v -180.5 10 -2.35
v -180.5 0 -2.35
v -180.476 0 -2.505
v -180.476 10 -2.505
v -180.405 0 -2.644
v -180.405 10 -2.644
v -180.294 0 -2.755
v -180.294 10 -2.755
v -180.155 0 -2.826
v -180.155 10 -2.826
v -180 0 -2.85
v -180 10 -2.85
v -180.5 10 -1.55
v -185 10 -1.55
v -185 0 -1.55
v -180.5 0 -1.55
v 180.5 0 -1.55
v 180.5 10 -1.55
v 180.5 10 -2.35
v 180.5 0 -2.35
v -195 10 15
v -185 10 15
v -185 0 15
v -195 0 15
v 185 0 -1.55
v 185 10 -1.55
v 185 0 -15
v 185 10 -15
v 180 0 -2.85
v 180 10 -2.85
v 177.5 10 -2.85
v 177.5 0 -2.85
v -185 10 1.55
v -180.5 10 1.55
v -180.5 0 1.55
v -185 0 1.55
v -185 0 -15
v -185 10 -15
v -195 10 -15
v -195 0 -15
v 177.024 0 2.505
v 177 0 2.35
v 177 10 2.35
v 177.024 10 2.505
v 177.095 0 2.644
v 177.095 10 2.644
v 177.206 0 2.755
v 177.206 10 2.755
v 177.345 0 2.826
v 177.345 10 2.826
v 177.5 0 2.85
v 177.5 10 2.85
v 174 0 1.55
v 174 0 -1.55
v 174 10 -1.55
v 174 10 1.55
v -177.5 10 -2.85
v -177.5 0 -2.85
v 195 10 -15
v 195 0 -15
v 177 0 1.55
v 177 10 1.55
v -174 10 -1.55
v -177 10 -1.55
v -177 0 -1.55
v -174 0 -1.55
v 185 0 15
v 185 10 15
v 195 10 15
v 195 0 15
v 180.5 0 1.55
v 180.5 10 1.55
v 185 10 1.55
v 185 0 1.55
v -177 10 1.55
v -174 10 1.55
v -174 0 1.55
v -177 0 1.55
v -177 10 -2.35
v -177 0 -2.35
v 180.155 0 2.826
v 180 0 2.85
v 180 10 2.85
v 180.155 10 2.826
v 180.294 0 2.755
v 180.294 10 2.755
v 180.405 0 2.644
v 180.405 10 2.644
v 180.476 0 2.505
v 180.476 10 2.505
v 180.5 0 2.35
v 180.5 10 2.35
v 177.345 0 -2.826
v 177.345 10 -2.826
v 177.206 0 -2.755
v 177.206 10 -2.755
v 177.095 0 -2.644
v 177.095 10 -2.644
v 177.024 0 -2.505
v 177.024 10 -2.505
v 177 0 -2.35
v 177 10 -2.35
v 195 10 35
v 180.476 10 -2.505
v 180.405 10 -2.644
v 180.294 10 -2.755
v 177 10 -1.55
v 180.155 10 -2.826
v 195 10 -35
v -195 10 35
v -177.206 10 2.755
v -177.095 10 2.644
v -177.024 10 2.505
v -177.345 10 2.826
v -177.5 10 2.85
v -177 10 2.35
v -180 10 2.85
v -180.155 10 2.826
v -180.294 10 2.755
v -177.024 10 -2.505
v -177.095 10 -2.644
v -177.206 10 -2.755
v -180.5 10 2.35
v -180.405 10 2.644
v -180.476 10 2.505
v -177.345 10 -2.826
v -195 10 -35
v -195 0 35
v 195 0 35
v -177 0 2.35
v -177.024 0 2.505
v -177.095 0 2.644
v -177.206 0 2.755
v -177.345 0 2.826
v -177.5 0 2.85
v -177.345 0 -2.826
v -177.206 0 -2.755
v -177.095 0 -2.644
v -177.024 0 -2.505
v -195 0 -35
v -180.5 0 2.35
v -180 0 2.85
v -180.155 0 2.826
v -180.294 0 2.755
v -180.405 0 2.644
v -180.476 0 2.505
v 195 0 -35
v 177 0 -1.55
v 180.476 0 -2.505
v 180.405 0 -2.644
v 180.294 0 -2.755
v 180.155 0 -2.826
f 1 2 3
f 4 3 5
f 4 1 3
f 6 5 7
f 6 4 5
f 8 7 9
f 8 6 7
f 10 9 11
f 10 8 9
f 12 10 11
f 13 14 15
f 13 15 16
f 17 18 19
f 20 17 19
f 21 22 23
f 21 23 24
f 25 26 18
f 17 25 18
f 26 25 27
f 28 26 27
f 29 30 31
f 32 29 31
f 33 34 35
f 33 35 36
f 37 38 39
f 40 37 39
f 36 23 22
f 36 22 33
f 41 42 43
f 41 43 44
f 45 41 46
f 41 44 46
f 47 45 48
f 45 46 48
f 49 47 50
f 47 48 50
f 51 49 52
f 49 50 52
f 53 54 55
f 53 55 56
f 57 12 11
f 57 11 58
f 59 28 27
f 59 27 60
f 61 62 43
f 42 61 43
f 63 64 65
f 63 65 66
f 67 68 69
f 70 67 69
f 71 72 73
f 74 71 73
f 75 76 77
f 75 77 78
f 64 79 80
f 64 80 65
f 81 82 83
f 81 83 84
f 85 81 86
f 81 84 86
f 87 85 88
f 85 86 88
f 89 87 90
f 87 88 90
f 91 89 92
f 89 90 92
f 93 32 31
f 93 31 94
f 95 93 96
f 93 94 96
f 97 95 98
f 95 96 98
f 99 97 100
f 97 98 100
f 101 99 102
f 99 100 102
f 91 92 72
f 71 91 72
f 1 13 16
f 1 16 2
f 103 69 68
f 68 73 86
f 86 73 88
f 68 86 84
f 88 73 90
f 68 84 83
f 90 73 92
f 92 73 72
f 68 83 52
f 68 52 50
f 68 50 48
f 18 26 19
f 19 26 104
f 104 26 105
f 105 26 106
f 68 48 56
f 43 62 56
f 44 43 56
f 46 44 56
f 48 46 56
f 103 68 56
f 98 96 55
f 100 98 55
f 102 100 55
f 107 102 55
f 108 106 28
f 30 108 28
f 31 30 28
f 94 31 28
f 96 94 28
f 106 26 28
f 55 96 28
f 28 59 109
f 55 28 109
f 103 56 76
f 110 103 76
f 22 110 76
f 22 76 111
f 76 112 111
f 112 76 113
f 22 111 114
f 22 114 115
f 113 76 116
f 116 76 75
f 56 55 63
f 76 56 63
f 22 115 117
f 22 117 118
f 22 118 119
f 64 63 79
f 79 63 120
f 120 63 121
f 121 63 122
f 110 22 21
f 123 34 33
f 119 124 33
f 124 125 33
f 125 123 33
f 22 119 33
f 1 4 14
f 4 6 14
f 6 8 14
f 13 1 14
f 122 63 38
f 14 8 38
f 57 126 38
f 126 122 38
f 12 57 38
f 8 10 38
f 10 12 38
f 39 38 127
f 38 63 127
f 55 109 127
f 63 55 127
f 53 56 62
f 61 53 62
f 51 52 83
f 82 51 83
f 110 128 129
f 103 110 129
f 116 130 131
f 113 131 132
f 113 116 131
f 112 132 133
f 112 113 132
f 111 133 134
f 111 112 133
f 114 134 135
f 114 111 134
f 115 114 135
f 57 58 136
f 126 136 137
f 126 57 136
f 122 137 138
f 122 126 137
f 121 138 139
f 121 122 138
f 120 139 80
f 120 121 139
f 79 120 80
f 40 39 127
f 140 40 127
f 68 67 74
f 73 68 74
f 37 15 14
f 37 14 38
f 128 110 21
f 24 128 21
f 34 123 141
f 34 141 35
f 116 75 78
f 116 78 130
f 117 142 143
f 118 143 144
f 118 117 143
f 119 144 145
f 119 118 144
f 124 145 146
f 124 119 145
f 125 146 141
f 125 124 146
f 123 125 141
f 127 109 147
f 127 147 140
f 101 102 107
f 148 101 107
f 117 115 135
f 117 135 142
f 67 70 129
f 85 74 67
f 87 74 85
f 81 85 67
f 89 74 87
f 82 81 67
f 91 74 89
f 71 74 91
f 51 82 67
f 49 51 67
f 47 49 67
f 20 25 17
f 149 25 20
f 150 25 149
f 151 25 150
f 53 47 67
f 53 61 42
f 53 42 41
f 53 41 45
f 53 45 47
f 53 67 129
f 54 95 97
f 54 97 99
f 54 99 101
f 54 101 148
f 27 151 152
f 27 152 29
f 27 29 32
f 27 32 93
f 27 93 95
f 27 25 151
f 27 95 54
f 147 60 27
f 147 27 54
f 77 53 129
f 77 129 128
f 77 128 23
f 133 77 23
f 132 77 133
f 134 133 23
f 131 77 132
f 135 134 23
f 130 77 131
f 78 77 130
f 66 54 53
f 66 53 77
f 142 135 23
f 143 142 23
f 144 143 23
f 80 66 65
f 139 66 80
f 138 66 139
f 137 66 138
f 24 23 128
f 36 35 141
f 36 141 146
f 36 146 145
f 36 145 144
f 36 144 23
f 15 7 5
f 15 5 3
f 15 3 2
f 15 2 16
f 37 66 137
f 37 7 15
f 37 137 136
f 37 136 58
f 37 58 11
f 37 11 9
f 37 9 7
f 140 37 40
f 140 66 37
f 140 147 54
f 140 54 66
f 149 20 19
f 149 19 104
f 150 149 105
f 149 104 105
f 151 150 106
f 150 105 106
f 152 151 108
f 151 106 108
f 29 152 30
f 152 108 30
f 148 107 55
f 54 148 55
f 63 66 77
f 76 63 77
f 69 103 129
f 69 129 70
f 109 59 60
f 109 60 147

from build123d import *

# Parameters (mm, degrees)
SKETCH1_W           = 370
SKETCH1_H           = 70
BOSS_EXTRUDE1_DEPTH = 10
SKETCH2_W           = 10
SKETCH2_H           = 20
BOSS_EXTRUDE2_DEPTH = 10
CUT_EXTRUDE1_DEPTH  = 199.368344249


with BuildPart() as part:
    # Sketch1 → Boss-Extrude1 (new body)
    with BuildSketch(Plane(origin=(0, 0, 0), x_dir=(1, 0, 0), z_dir=(0, 1, 0))):
        Rectangle(SKETCH1_W, SKETCH1_H)
    extrude(amount=BOSS_EXTRUDE1_DEPTH)

    # Sketch2 → Boss-Extrude2 (add, through all)
    with BuildSketch(Plane(origin=(0, 10, 0), x_dir=(1, 0, 0), z_dir=(0, 1, 0))):
        with Locations((190, 25)):
            Rectangle(SKETCH2_W, SKETCH2_H)
        with Locations((190, -25)):
            Rectangle(SKETCH2_W, SKETCH2_H)
    boss_extrude2 = extrude(amount=-BOSS_EXTRUDE2_DEPTH)

    # Sketch3 → Cut-Extrude1 (cut, through all)
    with BuildSketch(Plane(origin=(0, 10, 0), x_dir=(1, 0, 0), z_dir=(0, 1, 0))):
        with BuildLine():
            Line((185, -1.55), (185, 1.55))
            Line((185, 1.55), (180.5, 1.55))
            Line((180.5, 1.55), (180.5, 2.35))
            ThreePointArc((180.5, 2.35), (180.353553391, 2.703553391), (180, 2.85))
            Line((180, 2.85), (177.5, 2.85))
            ThreePointArc((177.5, 2.85), (177.146446609, 2.703553391), (177, 2.35))
            Line((177, 2.35), (177, 1.55))
            Line((177, 1.55), (174, 1.55))
            Line((174, 1.55), (174, -1.55))
            Line((174, -1.55), (177, -1.55))
            Line((177, -1.55), (177, -2.35))
            ThreePointArc((177, -2.35), (177.146446609, -2.703553391), (177.5, -2.85))
            Line((177.5, -2.85), (180, -2.85))
            ThreePointArc((180, -2.85), (180.353553391, -2.703553391), (180.5, -2.35))
            Line((180.5, -2.35), (180.5, -1.55))
            Line((180.5, -1.55), (185, -1.55))
        make_face()
    cut_extrude1 = extrude(amount=-CUT_EXTRUDE1_DEPTH, mode=Mode.SUBTRACT)

    # Mirror1: Boss-Extrude2, Cut-Extrude1 across plane
    add(boss_extrude2.mirror(Plane(origin=(0, 0, 0), x_dir=(0, 0, 1), z_dir=(1, 0, 0))))
    add(cut_extrude1.mirror(Plane(origin=(0, 0, 0), x_dir=(0, 0, 1), z_dir=(1, 0, 0))), mode=Mode.SUBTRACT)


solid = part.part
